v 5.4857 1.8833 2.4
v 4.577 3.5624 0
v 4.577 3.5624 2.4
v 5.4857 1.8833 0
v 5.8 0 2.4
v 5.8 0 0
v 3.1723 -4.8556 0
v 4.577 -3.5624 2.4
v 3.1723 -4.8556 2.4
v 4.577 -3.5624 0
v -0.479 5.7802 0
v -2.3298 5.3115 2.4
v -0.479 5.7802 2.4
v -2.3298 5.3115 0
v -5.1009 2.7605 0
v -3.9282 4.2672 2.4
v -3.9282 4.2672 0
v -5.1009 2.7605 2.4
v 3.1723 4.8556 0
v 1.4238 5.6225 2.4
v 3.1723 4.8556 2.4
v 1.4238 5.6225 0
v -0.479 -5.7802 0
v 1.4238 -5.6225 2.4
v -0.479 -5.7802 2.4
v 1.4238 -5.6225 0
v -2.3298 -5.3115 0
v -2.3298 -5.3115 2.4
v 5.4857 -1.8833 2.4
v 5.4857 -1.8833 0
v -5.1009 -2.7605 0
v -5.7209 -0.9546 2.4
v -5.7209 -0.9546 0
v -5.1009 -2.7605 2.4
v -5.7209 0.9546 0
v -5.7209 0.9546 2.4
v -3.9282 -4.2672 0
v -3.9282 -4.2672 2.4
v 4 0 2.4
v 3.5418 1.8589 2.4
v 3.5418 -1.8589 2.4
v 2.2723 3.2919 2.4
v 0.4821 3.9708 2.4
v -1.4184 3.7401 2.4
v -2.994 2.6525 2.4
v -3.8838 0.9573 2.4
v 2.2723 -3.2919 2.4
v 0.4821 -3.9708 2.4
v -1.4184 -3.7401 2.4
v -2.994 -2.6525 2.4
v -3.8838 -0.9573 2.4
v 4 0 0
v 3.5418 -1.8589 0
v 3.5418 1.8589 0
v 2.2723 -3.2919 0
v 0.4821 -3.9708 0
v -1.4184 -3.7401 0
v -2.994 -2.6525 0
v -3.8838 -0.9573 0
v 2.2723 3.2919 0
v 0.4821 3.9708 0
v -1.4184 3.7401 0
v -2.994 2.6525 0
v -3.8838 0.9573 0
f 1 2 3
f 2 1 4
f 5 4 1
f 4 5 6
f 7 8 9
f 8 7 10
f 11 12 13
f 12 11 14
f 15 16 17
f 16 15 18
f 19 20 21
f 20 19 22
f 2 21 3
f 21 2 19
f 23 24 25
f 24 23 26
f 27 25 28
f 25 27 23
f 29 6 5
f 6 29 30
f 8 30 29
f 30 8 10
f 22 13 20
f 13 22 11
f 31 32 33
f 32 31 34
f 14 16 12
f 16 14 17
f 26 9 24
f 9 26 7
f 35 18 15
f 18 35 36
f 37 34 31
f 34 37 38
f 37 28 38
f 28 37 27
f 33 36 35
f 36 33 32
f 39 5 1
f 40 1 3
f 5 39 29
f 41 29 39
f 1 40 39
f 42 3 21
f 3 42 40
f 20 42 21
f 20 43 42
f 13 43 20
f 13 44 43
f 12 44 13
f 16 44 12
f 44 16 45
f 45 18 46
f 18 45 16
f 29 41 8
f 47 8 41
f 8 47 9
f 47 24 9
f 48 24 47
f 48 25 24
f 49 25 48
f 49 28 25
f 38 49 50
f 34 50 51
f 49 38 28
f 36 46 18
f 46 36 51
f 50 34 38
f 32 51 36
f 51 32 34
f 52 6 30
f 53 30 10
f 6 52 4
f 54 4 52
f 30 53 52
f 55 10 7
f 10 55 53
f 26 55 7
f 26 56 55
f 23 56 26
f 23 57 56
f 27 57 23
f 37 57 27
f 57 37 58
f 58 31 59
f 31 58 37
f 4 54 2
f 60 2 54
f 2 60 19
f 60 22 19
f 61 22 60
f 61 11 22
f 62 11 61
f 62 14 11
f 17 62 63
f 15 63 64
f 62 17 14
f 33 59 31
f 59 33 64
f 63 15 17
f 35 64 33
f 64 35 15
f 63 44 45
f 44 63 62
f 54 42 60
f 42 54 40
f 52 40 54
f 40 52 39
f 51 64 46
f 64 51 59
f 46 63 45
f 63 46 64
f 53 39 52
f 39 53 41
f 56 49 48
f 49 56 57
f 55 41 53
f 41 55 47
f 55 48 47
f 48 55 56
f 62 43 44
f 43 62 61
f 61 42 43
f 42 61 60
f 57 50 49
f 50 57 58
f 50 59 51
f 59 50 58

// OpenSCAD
//Select which element you want to create the stl for..
// for a full chess board (64 squares) you will need:
// 2 corner_tile of each color
// 14 edge_tile of each color
// 16 center_tile of each color
// 112 lock rings (color doesn't matter)

//center_tile();
//corner_tile();
//edge_tile();
lock_ring();


module frame()
{
    linear_extrude(height=5) difference(){
        square(size=45, center = true);
        square(size=39, center = true);
    }
    linear_extrude(height=2) difference(){
        square(size=39, center = true);
        square(size=33, center = true);
    }
}

module circle()
{
    $fn = 35;
    difference(){
        cylinder(h=2, d=19);
        cylinder(h=2, d=16);
    }
} 

module lock_post()
{
    difference(){
        cylinder(h=3, d=12);
        cylinder(h=3, d=8);
    }
}      

module lock_ring()
{
    difference(){
        cylinder(h=2.4, d=11.6);
        cylinder(h=2.4, d=8);
//        cylinder(h=2.4, d=8.3);
    }
}      

module center_tile()
{
    difference(){
        frame();    
        translate([-22.5,0,2]) lock_post();
        translate([22.5,0,2]) lock_post();
        translate([0,22.5,2]) lock_post();
        translate([0,-22.5,2]) lock_post();
    }   
    translate([-10,-10,0]) circle();
    translate([-10,0,0]) circle();
    translate([-10,10,0]) circle();
    
    translate([0,-10,0]) circle();
    translate([0,0,0]) circle();
    translate([0,10,0]) circle();
    
    translate([10,-10,0]) circle();
    translate([10,0,0]) circle();
    translate([10,10,0]) circle();
}

module corner_tile()
{
    difference(){
        frame();    
        translate([-22.5,0,2]) lock_post();
        translate([0,-22.5,2]) lock_post();
    }   
    translate([-10,-10,0]) circle();
    translate([-10,0,0]) circle();
    translate([-10,10,0]) circle();
    
    translate([0,-10,0]) circle();
    translate([0,0,0]) circle();
    translate([0,10,0]) circle();
    
    translate([10,-10,0]) circle();
    translate([10,0,0]) circle();
    translate([10,10,0]) circle();
}

module edge_tile()
{
    difference(){
        frame();    
        translate([-22.5,0,2]) lock_post();
        translate([0,-22.5,2]) lock_post();
        translate([0,22.5,2]) lock_post();
    }  
    
    translate([-10,-10,0]) circle();
    translate([-10,0,0]) circle();
    translate([-10,10,0]) circle();
    
    translate([0,-10,0]) circle();
    translate([0,0,0]) circle();
    translate([0,10,0]) circle();
    
    translate([10,-10,0]) circle();
    translate([10,0,0]) circle();
    translate([10,10,0]) circle();
}

//center_tile();
//corner_tile();
//edge_tile();
lock_ring();
